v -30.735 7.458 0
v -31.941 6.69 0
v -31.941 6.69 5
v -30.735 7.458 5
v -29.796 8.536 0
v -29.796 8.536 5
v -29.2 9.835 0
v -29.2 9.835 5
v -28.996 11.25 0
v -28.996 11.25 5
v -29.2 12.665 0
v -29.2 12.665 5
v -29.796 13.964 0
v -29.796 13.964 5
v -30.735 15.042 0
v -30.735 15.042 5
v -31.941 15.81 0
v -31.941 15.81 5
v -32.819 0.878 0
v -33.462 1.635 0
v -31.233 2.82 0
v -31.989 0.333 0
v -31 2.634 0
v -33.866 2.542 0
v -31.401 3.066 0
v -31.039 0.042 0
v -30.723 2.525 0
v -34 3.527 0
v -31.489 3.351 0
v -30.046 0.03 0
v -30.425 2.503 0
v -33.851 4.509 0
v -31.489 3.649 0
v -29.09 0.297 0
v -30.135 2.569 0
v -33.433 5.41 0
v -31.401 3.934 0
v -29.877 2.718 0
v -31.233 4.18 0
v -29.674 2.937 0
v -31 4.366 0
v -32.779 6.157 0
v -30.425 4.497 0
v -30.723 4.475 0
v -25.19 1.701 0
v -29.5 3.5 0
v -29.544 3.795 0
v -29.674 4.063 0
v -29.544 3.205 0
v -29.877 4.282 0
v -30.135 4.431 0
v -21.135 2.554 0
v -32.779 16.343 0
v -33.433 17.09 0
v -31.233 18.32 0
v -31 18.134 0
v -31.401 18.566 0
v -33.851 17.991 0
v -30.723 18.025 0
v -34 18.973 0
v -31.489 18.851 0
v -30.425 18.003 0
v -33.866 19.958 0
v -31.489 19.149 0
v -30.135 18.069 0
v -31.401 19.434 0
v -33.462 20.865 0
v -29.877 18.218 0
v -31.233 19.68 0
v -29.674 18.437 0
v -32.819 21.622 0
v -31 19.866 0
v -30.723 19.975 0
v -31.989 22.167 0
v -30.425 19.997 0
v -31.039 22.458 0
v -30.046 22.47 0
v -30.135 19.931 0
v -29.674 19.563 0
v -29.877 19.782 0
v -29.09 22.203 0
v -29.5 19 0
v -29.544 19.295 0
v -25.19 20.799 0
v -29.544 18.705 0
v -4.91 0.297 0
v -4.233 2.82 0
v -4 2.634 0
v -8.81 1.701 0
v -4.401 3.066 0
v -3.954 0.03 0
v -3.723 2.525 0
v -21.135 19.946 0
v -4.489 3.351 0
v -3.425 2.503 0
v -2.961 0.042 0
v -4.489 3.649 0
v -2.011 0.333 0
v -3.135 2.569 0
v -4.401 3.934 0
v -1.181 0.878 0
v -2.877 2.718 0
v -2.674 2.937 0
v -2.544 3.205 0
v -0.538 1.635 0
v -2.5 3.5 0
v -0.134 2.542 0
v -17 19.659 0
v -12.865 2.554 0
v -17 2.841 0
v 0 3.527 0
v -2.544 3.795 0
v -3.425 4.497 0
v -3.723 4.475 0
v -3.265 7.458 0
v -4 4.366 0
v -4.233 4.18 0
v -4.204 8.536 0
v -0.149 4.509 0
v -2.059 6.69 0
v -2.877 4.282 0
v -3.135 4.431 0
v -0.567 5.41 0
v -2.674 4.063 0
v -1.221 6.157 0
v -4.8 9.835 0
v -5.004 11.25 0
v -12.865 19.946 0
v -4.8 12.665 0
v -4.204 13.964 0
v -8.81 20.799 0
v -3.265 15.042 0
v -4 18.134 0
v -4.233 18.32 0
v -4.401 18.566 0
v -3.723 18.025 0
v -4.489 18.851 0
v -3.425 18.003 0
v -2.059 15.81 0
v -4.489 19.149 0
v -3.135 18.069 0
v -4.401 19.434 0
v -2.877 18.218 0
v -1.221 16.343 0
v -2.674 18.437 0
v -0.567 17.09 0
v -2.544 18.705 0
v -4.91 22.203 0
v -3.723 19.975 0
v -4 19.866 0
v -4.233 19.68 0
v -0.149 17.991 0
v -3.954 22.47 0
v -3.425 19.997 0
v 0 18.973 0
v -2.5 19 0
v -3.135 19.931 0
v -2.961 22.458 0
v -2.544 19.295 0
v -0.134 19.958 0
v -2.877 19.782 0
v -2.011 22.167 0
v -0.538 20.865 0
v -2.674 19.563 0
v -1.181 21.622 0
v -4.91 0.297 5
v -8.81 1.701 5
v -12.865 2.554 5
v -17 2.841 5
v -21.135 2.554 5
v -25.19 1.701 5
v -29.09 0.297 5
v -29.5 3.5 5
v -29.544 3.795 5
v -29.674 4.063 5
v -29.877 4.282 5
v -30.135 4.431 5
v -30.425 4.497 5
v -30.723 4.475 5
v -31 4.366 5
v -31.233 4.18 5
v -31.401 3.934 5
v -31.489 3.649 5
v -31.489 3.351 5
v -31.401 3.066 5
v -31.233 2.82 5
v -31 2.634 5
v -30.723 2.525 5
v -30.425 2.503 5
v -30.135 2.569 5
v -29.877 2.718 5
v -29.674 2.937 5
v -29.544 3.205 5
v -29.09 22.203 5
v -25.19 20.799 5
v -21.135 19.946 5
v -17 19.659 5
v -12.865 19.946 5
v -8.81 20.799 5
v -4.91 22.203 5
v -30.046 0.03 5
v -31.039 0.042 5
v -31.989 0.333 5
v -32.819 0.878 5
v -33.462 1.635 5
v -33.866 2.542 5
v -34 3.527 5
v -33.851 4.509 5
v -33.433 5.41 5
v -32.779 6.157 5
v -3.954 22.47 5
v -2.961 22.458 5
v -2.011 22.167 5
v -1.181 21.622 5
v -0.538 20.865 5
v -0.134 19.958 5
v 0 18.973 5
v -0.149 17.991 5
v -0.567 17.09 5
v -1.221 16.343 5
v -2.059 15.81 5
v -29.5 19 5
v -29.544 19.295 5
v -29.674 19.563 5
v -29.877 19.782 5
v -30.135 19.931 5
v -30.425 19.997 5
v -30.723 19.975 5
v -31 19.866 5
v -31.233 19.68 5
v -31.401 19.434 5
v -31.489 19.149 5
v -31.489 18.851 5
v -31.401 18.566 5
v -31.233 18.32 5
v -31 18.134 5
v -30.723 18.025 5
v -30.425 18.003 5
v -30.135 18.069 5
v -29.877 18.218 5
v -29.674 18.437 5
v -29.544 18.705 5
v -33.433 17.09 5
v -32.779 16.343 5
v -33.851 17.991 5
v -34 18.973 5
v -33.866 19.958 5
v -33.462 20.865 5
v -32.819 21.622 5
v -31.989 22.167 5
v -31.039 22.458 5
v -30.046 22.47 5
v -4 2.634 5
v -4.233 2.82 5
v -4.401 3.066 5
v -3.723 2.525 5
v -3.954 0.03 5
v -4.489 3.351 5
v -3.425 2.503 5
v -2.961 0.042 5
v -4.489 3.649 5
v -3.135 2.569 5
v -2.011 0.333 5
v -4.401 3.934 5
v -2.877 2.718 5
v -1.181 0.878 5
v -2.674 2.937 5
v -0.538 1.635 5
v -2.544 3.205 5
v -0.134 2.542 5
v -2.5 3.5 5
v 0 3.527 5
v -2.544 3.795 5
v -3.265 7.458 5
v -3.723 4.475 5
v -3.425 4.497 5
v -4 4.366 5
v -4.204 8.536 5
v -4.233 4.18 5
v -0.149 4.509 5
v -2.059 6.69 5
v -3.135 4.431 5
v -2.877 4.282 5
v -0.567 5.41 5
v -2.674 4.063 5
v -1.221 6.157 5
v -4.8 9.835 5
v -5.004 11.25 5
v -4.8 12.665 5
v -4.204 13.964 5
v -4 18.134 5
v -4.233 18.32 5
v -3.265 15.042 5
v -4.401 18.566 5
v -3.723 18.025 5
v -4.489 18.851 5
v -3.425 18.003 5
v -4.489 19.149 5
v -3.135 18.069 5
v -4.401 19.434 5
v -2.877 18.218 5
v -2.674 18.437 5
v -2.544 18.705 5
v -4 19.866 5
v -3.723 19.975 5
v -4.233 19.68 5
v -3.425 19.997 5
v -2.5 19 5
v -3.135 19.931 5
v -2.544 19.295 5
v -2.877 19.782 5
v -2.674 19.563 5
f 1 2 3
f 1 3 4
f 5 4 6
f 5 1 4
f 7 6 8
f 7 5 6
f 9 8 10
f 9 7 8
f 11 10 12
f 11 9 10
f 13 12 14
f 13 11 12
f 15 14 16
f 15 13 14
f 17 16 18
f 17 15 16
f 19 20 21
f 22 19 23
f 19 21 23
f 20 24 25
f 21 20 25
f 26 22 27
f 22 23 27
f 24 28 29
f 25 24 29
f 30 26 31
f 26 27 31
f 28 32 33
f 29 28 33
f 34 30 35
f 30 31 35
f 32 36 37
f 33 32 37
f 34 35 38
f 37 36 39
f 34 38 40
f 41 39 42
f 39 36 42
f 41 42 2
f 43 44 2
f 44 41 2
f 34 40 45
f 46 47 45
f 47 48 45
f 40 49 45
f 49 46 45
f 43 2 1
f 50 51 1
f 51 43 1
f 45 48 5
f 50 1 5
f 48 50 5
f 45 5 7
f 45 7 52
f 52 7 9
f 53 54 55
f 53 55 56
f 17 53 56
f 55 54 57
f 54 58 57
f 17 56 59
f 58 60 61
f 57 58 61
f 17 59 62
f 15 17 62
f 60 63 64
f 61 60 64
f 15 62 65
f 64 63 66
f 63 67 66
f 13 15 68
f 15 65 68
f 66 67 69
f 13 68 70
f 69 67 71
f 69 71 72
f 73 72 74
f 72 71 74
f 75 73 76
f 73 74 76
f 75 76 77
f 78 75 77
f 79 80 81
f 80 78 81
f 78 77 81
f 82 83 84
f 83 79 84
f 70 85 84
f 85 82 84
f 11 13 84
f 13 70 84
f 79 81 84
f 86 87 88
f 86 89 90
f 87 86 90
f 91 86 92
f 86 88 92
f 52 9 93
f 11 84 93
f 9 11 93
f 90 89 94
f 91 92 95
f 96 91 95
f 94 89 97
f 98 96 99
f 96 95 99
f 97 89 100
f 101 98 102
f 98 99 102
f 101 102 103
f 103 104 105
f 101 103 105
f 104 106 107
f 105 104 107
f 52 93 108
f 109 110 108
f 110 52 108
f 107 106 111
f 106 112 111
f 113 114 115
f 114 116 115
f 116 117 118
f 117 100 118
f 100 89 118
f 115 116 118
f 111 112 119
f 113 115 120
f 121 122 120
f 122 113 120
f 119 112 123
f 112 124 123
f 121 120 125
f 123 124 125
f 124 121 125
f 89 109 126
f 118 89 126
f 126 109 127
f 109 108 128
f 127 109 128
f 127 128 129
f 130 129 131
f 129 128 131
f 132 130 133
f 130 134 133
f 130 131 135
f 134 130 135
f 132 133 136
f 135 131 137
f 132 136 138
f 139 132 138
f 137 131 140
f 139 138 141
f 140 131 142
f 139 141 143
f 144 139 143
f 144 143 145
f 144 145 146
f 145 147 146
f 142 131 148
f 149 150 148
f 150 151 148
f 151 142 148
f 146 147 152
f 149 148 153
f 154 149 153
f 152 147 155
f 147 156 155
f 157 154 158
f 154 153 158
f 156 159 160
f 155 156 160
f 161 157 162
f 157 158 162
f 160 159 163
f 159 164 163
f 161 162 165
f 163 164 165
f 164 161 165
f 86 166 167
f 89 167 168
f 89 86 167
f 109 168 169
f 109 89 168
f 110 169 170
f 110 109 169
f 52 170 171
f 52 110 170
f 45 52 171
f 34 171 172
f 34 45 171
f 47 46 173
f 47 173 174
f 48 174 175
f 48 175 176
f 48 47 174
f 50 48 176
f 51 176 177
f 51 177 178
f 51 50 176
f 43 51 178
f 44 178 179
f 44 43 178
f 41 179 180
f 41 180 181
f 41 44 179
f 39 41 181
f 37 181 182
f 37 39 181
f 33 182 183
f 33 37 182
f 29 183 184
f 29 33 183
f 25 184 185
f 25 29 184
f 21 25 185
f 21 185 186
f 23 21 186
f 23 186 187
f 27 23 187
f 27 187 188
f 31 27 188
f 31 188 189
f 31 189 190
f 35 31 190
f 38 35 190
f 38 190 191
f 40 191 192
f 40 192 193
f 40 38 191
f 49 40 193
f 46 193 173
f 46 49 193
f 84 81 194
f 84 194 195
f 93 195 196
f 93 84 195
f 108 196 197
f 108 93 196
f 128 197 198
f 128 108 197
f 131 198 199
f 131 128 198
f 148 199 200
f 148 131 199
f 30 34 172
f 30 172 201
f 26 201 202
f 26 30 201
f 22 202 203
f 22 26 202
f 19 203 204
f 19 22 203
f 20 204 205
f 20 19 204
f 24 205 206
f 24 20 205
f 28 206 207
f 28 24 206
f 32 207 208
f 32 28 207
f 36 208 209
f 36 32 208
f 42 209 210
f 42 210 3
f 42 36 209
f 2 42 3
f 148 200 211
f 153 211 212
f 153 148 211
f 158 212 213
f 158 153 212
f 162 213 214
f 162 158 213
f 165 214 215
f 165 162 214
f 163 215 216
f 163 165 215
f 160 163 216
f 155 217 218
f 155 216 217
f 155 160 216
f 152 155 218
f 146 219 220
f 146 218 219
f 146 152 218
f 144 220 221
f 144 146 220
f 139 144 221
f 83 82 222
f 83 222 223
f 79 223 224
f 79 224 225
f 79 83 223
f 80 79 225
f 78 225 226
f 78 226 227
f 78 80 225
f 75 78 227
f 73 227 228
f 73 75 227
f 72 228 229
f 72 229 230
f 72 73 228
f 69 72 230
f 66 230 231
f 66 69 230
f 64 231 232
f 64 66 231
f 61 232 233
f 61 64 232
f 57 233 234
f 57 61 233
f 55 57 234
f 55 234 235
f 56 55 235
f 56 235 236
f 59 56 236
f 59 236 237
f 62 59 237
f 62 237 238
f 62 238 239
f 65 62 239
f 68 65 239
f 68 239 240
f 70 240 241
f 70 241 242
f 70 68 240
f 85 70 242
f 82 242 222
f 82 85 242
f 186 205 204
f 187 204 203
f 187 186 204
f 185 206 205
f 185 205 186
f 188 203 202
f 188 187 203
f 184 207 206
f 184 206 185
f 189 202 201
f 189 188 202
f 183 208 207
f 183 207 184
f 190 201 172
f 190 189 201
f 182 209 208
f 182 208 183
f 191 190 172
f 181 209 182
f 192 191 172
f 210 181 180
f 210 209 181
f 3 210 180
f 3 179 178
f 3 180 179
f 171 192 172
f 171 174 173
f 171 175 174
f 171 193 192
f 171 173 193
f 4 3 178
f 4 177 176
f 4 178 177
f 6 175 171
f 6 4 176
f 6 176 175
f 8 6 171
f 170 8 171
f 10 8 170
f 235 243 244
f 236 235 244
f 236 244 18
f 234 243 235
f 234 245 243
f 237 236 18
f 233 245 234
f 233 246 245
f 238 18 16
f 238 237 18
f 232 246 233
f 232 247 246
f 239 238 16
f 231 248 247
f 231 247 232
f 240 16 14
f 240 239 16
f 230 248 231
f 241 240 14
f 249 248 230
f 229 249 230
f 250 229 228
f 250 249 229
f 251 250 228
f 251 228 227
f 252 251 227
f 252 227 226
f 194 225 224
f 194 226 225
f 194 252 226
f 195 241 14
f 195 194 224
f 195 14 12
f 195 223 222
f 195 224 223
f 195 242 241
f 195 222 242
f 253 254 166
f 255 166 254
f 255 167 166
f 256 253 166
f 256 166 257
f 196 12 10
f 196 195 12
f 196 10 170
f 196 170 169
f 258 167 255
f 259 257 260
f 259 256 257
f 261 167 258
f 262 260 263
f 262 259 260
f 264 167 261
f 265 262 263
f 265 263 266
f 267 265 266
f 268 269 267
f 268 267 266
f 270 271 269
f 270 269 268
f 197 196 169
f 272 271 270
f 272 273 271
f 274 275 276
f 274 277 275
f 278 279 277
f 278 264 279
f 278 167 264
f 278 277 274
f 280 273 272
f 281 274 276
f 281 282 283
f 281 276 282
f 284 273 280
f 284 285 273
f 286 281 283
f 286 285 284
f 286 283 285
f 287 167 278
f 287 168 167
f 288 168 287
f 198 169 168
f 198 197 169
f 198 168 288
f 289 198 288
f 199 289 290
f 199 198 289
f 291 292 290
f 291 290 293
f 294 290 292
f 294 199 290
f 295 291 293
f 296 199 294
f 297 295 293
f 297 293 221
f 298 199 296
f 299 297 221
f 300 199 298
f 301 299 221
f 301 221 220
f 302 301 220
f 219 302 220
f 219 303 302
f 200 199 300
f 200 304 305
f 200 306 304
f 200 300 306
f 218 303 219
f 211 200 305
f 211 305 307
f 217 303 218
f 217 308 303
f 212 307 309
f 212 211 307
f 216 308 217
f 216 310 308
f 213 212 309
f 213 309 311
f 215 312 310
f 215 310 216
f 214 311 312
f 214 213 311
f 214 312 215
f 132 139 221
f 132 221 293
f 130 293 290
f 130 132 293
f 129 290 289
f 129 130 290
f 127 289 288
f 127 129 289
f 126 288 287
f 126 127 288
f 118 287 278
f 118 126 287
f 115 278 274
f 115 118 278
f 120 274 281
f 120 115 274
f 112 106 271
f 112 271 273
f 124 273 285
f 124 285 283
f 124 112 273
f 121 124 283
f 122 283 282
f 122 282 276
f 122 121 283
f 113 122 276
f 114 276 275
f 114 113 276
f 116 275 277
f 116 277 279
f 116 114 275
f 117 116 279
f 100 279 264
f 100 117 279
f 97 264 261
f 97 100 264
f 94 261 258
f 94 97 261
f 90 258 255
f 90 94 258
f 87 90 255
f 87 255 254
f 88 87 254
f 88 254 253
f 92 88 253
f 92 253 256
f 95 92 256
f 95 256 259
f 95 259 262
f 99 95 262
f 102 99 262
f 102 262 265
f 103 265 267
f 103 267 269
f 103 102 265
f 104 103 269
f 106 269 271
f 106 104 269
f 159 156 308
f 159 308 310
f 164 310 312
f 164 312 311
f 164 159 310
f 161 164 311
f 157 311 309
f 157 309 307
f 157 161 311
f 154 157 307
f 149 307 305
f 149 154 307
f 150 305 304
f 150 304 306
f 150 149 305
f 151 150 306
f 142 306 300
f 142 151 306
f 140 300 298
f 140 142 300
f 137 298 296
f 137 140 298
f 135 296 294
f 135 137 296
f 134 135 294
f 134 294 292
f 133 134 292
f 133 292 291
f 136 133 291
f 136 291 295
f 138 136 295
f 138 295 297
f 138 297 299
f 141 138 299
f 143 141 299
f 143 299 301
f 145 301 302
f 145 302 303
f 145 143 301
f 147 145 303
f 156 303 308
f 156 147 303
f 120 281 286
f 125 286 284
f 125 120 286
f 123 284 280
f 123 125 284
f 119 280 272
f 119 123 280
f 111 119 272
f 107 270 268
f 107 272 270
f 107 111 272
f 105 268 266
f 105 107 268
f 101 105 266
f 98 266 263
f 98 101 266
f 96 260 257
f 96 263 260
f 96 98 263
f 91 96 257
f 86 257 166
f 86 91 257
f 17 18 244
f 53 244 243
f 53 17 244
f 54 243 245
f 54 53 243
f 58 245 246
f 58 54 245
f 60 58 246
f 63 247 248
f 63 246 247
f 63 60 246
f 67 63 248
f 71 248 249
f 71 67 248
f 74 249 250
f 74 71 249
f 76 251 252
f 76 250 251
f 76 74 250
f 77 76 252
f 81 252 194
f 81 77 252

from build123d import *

# Parameters (mm, degrees)
ESQUISSE1_W        = 34
ESQUISSE1_H        = 22.5
ESQUISSE1_R        = 1
BOSS_EXTRU_1_DEPTH = 5
CUT_EXTRUDE1_DEPTH = 10


with BuildPart() as part:
    # Esquisse1 → Boss.-Extru.1 (new body)
    with BuildSketch(Plane.XY):
        with Locations((-17, 11.25)):
            Rectangle(ESQUISSE1_W, ESQUISSE1_H)
        with Locations((-30.5, 19)):
            Circle(ESQUISSE1_R, mode=Mode.SUBTRACT)
        with Locations((-3.5, 19)):
            Circle(ESQUISSE1_R, mode=Mode.SUBTRACT)
        with Locations((-3.5, 3.5)):
            Circle(ESQUISSE1_R, mode=Mode.SUBTRACT)
        with Locations((-30.5, 3.5)):
            Circle(ESQUISSE1_R, mode=Mode.SUBTRACT)
    extrude(amount=BOSS_EXTRU_1_DEPTH)

    # Sketch1 → Cut-Extrude1 (cut)
    with BuildSketch(Plane(origin=(0, 0, 0), x_dir=(-1, 0, 0), z_dir=(0, 0, -1))):
        Polygon((35.959040793, 25.036749556), (37.525504355, -3.285522646), (-6.460348748, -5.71831602), (-8.02681231, 22.603956182), align=None)
        with BuildLine():
            ThreePointArc((31.940553528, 15.810202901), (33.696545455, 20.425516451), (29.089552239, 22.203222926))
            ThreePointArc((29.089552239, 22.203222926), (17, 19.659419434), (4.910447761, 22.203222926))
            ThreePointArc((4.910447761, 22.203222926), (0.303454545, 20.425516451), (2.059446472, 15.810202901))
            ThreePointArc((2.059446472, 15.810202901), (5.003675676, 11.25), (2.059446472, 6.689797099))
            ThreePointArc((2.059446472, 6.689797099), (0.303454545, 2.074483549), (4.910447761, 0.296777074))
            ThreePointArc((4.910447761, 0.296777074), (17, 2.840580566), (29.089552239, 0.296777074))
            ThreePointArc((29.089552239, 0.296777074), (33.696545455, 2.074483549), (31.940553528, 6.689797099))
            ThreePointArc((31.940553528, 6.689797099), (28.996324324, 11.25), (31.940553528, 15.810202901))
        make_face(mode=Mode.SUBTRACT)
    extrude(amount=-CUT_EXTRUDE1_DEPTH, mode=Mode.SUBTRACT)


solid = part.part
